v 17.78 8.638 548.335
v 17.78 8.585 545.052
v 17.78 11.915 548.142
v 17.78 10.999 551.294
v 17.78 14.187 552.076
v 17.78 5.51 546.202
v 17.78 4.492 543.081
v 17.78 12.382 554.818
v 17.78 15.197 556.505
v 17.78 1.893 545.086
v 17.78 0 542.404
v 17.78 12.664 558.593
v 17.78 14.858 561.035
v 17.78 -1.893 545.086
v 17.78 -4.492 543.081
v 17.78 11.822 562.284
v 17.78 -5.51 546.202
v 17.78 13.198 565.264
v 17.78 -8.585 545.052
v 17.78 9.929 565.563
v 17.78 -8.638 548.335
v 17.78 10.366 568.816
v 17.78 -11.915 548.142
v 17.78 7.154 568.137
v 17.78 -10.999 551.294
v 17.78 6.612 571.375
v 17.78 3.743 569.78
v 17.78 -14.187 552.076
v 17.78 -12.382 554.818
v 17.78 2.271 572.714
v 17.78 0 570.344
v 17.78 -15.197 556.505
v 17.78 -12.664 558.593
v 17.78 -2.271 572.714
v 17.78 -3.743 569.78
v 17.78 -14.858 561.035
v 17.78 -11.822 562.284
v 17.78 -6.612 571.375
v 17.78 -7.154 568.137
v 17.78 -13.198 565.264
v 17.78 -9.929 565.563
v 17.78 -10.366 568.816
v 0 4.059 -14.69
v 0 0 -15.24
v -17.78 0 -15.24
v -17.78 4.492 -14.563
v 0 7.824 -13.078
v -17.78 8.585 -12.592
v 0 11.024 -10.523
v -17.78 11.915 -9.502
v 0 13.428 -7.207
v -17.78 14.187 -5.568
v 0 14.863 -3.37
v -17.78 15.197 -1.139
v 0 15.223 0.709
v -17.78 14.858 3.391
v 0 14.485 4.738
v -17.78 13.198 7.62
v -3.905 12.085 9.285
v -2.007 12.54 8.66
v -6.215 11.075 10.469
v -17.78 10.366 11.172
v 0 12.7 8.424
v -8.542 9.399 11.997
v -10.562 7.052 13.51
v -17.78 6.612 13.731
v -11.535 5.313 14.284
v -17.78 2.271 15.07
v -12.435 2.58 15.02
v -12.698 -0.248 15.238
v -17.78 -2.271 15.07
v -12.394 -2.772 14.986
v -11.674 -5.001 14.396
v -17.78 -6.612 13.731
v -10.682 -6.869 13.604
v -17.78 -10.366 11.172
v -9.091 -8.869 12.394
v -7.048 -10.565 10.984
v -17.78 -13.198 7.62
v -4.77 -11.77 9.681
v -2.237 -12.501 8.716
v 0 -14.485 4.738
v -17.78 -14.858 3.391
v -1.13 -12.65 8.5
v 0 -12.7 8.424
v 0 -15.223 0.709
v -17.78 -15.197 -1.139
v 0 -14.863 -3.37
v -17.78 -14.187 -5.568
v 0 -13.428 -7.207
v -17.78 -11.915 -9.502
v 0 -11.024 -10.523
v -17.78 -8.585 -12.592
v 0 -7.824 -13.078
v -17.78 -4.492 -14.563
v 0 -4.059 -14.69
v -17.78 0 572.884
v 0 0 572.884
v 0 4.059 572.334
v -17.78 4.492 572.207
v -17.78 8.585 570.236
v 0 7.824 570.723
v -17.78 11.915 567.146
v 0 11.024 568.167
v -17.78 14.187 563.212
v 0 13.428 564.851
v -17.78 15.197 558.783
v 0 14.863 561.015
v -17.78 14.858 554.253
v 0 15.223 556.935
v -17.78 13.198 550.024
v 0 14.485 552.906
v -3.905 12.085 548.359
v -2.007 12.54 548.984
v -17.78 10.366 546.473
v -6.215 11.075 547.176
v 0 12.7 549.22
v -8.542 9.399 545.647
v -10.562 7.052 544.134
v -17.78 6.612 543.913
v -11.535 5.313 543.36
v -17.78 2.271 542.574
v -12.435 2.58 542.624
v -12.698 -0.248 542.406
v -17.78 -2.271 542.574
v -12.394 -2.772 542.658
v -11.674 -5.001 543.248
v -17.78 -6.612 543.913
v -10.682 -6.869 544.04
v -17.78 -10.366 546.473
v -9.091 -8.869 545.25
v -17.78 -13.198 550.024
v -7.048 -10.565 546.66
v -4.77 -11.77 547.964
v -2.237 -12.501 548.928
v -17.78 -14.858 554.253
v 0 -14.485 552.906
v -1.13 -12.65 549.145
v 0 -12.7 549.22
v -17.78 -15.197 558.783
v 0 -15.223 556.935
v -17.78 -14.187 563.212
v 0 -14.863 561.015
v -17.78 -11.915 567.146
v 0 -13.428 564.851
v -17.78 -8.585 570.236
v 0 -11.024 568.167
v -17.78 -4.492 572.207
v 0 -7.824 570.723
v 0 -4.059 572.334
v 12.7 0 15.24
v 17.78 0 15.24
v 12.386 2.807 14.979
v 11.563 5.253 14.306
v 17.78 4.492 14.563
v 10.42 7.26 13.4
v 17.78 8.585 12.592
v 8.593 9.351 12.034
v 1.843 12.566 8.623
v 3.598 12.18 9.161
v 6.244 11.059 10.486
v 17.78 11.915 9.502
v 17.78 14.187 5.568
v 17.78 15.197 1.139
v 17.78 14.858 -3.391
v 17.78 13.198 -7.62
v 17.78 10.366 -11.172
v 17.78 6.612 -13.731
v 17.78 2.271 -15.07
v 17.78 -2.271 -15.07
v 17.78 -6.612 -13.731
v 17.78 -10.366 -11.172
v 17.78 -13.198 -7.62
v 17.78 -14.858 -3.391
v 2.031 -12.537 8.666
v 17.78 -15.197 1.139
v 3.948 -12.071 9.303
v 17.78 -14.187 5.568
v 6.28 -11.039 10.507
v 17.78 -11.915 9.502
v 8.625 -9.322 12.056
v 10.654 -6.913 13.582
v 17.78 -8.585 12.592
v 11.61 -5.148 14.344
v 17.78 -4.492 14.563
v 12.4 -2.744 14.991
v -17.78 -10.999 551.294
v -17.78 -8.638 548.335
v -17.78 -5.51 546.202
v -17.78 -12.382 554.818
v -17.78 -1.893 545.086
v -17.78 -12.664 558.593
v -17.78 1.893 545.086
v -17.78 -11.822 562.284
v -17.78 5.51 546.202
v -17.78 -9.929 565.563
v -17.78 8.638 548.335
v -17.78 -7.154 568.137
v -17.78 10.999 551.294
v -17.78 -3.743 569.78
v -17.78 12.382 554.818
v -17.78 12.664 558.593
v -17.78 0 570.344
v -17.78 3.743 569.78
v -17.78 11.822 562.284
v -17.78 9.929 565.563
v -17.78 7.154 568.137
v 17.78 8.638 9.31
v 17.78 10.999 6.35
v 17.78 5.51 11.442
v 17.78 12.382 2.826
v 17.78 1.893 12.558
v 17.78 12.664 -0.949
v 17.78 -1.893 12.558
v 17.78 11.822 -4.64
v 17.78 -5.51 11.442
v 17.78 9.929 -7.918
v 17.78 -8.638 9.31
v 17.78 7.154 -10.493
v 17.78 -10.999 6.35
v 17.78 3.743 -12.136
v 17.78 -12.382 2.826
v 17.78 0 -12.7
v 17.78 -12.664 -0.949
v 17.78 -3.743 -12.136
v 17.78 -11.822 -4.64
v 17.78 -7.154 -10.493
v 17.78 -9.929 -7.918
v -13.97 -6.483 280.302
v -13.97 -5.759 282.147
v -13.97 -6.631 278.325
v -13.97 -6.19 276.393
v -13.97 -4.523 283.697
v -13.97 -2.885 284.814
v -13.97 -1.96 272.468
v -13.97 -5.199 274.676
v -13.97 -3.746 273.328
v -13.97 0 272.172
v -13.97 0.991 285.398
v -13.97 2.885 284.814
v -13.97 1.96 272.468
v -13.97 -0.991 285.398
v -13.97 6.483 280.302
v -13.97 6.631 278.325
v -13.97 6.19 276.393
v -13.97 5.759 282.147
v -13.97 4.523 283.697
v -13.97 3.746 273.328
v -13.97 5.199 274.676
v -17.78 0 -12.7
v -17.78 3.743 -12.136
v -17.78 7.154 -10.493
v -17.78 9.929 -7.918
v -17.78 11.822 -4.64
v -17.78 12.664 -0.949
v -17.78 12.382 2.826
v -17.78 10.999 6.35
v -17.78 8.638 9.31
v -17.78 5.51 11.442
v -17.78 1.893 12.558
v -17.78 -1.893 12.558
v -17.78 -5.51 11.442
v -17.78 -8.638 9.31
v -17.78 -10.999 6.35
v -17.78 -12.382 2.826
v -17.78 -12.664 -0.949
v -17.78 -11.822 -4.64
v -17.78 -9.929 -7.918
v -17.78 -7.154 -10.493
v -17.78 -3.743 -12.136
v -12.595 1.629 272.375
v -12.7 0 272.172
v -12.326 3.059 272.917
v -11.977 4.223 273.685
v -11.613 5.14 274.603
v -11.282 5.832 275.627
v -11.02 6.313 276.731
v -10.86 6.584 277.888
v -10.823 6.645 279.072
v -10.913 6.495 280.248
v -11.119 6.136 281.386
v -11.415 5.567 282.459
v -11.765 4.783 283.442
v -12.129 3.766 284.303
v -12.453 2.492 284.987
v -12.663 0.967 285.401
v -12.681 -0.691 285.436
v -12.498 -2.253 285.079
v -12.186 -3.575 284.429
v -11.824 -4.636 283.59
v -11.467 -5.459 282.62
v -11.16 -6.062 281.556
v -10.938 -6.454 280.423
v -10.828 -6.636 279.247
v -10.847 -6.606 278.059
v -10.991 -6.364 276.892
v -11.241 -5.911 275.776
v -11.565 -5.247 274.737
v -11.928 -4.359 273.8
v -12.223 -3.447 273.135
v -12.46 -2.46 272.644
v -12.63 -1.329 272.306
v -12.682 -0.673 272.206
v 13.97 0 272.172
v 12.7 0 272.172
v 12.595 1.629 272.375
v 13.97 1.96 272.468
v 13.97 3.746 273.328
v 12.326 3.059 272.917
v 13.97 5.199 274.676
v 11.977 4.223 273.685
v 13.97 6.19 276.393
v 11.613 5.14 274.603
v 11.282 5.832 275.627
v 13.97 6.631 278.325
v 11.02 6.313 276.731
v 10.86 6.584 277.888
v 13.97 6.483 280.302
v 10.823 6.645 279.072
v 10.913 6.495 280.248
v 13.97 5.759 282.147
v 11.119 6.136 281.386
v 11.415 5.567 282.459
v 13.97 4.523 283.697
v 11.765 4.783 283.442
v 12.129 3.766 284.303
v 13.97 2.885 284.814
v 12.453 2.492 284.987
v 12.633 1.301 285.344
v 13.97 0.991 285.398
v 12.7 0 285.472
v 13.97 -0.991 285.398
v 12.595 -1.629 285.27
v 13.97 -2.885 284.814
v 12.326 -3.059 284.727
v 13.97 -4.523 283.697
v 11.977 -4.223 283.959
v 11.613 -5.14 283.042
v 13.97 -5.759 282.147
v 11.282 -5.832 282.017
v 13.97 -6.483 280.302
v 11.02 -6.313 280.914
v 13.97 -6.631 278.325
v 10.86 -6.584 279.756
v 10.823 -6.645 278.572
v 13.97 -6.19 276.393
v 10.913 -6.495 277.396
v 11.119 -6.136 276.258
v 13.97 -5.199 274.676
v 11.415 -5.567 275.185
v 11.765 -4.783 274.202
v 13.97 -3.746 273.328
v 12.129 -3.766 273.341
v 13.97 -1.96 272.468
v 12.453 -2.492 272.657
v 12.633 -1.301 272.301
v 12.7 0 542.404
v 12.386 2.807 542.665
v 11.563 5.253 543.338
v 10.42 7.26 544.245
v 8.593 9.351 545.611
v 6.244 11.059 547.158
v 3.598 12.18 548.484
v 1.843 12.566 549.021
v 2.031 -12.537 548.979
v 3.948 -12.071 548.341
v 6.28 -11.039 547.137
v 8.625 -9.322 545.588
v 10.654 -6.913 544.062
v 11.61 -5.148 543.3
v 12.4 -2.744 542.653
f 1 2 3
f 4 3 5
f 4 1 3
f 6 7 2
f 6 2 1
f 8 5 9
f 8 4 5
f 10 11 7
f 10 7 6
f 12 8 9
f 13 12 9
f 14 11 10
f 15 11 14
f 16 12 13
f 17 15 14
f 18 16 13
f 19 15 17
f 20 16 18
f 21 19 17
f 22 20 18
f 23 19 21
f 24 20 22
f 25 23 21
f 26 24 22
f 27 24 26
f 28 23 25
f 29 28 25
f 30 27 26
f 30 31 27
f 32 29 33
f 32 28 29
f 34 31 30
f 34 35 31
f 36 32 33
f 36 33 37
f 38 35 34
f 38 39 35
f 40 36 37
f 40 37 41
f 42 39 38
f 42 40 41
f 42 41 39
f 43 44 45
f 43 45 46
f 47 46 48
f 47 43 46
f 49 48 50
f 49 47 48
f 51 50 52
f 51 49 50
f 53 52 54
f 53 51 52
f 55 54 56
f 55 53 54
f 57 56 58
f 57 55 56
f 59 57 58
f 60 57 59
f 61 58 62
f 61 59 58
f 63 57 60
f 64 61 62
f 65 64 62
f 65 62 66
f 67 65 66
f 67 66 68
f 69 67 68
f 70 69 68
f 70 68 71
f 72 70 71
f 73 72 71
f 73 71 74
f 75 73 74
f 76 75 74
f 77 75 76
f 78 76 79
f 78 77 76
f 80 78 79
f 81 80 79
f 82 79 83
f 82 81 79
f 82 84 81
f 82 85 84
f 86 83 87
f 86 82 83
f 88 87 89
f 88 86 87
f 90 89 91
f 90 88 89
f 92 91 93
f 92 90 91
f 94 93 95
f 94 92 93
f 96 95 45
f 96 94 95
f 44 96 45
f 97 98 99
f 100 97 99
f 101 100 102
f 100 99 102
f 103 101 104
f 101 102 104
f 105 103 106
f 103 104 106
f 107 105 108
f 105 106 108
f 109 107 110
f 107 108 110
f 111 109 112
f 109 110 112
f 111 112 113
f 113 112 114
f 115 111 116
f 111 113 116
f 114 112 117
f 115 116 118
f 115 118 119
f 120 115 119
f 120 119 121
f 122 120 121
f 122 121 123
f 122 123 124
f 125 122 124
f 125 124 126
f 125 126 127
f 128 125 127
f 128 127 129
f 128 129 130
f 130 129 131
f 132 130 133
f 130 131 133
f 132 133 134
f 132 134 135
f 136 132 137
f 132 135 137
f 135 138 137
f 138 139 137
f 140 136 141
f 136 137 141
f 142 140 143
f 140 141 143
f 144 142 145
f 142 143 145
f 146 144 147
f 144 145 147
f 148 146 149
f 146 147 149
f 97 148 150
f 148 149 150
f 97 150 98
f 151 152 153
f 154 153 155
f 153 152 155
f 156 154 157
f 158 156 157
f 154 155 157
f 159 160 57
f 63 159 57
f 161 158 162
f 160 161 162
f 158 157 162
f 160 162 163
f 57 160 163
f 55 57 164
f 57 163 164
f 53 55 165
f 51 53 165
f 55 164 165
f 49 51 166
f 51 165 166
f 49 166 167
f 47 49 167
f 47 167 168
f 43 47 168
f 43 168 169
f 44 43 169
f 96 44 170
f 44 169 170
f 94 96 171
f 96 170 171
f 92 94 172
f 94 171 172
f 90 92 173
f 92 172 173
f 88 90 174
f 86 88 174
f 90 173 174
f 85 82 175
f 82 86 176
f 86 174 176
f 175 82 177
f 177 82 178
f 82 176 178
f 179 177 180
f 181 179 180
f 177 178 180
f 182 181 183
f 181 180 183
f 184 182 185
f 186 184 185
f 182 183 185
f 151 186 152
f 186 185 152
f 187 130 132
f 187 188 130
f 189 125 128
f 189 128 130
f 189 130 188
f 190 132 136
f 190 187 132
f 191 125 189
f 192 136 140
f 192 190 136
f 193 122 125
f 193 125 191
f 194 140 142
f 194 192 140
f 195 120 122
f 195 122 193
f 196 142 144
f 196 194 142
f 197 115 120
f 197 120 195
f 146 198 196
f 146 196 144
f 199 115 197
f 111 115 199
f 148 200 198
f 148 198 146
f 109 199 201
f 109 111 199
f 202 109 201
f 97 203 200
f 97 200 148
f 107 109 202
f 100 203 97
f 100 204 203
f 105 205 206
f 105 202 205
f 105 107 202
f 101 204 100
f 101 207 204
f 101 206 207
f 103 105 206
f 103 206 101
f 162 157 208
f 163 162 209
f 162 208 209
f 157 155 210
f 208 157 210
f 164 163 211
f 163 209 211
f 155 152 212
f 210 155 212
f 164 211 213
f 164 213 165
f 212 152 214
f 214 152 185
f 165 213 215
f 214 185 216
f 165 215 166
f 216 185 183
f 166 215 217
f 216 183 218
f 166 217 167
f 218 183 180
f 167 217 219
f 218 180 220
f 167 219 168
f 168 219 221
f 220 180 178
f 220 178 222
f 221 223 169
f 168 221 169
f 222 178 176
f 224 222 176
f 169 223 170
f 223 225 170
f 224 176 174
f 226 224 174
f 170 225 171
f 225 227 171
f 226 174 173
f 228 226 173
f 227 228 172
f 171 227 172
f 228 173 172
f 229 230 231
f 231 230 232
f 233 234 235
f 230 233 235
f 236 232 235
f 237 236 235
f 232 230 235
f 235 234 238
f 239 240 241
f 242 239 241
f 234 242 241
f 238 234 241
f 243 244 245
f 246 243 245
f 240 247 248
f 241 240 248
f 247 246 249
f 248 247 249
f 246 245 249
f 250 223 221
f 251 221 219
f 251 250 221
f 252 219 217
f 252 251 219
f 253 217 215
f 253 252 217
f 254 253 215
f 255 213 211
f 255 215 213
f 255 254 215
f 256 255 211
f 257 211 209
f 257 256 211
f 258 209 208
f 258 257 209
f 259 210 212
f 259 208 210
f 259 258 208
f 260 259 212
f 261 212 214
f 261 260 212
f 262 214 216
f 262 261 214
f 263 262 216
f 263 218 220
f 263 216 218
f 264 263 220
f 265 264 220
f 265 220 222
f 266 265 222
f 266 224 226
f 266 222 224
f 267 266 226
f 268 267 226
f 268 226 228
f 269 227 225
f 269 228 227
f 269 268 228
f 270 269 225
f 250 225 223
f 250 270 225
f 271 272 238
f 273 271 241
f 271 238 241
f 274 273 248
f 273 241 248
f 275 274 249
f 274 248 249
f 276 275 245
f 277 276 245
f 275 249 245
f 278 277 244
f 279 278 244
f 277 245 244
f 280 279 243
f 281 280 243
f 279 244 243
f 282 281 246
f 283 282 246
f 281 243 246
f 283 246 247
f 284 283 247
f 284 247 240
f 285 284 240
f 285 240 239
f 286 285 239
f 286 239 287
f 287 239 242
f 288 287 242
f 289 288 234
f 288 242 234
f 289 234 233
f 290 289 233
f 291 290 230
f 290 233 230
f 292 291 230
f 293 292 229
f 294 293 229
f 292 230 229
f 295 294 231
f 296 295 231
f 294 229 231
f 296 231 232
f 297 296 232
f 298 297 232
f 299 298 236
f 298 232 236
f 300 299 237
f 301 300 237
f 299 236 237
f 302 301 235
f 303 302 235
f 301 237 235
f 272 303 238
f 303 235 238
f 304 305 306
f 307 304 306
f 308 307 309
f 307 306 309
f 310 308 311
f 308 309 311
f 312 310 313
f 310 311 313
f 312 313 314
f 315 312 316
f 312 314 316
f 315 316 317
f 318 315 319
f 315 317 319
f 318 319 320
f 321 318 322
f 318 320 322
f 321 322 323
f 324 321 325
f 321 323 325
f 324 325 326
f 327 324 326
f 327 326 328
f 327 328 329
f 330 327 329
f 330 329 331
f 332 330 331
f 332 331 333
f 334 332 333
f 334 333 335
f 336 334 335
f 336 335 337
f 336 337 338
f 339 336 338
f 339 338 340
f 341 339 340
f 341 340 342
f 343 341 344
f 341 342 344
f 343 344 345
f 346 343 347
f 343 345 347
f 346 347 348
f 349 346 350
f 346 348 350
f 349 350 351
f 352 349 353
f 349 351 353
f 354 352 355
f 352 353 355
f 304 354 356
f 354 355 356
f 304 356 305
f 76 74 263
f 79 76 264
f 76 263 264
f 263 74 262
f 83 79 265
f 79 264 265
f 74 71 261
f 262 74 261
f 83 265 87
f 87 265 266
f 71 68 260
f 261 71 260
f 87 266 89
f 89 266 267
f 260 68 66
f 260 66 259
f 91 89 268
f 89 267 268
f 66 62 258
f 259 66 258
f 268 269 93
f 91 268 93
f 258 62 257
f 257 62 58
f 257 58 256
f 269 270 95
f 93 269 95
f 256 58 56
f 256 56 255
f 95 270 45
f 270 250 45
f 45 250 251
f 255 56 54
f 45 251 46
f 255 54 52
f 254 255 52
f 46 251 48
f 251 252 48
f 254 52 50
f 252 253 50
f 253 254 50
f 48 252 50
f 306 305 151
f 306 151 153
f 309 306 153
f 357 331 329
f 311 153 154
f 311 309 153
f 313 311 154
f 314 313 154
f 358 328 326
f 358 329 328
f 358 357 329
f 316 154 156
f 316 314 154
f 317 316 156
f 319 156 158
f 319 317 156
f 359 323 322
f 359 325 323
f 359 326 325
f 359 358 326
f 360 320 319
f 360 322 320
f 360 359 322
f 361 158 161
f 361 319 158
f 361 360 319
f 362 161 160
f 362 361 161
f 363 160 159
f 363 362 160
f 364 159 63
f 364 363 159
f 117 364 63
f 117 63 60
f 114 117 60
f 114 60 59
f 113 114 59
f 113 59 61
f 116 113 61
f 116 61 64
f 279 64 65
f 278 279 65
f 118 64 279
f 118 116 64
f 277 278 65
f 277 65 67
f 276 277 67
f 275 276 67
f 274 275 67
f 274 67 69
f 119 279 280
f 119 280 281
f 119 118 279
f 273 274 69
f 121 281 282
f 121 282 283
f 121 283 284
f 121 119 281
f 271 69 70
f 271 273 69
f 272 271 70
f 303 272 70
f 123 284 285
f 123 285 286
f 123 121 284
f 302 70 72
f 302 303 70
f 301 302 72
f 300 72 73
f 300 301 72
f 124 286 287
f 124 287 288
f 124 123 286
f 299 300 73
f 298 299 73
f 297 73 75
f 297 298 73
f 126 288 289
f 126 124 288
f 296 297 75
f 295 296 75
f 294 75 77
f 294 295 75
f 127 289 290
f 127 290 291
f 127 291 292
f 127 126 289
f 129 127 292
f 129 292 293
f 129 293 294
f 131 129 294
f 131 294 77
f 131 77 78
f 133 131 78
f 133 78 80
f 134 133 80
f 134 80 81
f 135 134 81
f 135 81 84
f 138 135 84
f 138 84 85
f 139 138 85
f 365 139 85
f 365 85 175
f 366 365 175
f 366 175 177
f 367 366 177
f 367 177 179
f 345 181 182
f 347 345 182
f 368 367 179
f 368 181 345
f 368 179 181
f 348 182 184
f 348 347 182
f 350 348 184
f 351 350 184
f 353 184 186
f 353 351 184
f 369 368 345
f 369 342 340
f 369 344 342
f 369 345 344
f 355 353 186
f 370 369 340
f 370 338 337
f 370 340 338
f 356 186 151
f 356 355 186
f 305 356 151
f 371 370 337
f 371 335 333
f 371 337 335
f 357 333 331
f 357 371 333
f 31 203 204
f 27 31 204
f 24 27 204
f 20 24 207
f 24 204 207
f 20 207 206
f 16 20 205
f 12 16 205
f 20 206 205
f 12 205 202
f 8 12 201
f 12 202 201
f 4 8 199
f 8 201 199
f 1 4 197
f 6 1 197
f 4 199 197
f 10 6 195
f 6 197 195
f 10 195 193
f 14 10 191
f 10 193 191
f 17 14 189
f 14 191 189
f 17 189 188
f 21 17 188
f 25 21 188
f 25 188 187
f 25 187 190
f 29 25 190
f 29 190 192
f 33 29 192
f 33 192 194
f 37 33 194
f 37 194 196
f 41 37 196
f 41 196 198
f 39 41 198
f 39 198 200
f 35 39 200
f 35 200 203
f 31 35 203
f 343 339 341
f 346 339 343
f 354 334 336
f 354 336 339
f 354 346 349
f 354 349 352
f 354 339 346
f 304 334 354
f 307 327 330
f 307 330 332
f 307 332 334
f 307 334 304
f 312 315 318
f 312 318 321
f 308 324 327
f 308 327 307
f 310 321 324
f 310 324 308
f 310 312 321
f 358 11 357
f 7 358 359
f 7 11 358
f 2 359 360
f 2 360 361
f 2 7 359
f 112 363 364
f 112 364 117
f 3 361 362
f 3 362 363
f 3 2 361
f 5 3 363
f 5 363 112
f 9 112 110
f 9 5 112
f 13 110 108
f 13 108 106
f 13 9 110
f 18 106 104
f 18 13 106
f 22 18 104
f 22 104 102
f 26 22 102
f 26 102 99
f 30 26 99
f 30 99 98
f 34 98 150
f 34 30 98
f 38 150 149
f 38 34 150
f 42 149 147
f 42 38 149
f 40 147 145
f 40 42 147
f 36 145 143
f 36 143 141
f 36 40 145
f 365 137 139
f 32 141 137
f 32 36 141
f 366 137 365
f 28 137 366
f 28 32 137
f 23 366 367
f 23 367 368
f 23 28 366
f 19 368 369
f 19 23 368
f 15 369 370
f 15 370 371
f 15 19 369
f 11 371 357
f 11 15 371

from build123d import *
from build123d.topology import SkipClean

# Parameters (mm, degrees)
SKETCH2_R                = 12.7
SKETCH4_R                = 15.24
SKETCH5_R                = 15.24
BOSS_EXTRUDE1_DEPTH      = 17.78
SKETCH7_R                = 12.7
CUT_EXTRUDE1_DEPTH       = 575.189120366
BOSS_EXTRUDE2_DEPTH      = 13.97
BOSS_EXTRUDE2_DEPTH_BACK = 13.97
SKETCH8_R                = 6.649982279


with BuildPart() as part:
    # Sweep1: sweep along a path in Sketch1
    with BuildLine(Plane(origin=(0, 0, 0), x_dir=(0, 0, -1), z_dir=(1, 0, 0))) as sweep1_path:
        Line((0, 0), (-557.64425936, 0))
    # Sketch2 → Sweep1 (sweep)
    with BuildSketch(Plane.XY):
        Circle(SKETCH2_R)
    sweep(path=sweep1_path.line)

    # Sweep2: sweep along a path in Sketch3
    with BuildLine(Plane(origin=(0, 0, 0), x_dir=(1, 0, 0), z_dir=(0, 1, 0))) as sweep2_path:
        Line((0, -557.64425936), (17.78, -557.64425936))
    # Sketch4 → Sweep2 (sweep)
    with BuildSketch(Plane(origin=(0, 0, 0), x_dir=(0, 0, -1), z_dir=(1, 0, 0))):
        with Locations((-557.64425936, 0)):
            Circle(SKETCH4_R)
    sweep2 = sweep(path=sweep2_path.line)

    # Sketch5 → Boss-Extrude1 (add)
    with SkipClean():  # the faces are left unmerged after this step: merging them gives an invalid solid
        with BuildSketch(Plane.ZY):
            with Locations((557.64425936, 0)):
                Circle(SKETCH5_R)
        boss_extrude1 = extrude(amount=BOSS_EXTRUDE1_DEPTH)
    add(part.part.scale(1), mode=Mode.REPLACE)  # the faces are merged on a copy

    # Sketch7 → Cut-Extrude1 (cut, through all)
    with BuildSketch(Plane.ZY.offset(17.78)):
        with Locations((557.64425936, 0)):
            Circle(SKETCH7_R)
    cut_extrude1 = extrude(amount=-CUT_EXTRUDE1_DEPTH, mode=Mode.SUBTRACT)

    # Mirror1: Sweep2, Boss-Extrude1, Cut-Extrude1 across plane
    add(sweep2.mirror(Plane.XY.offset(278.82212968)))
    add(boss_extrude1.mirror(Plane.XY.offset(278.82212968)))
    add(cut_extrude1.mirror(Plane.XY.offset(278.82212968)), mode=Mode.SUBTRACT)

    # Sketch8 → Boss-Extrude2 (add, two sides: drawn at the far end of the back side and taken through both)
    with BuildSketch(Plane(origin=(0, 0, 0), x_dir=(0, 0, -1), z_dir=(1, 0, 0)).offset(-BOSS_EXTRUDE2_DEPTH_BACK)):
        with Locations((-278.82212968, 0)):
            Circle(SKETCH8_R)
    extrude(amount=BOSS_EXTRUDE2_DEPTH + BOSS_EXTRUDE2_DEPTH_BACK)


solid = part.part
